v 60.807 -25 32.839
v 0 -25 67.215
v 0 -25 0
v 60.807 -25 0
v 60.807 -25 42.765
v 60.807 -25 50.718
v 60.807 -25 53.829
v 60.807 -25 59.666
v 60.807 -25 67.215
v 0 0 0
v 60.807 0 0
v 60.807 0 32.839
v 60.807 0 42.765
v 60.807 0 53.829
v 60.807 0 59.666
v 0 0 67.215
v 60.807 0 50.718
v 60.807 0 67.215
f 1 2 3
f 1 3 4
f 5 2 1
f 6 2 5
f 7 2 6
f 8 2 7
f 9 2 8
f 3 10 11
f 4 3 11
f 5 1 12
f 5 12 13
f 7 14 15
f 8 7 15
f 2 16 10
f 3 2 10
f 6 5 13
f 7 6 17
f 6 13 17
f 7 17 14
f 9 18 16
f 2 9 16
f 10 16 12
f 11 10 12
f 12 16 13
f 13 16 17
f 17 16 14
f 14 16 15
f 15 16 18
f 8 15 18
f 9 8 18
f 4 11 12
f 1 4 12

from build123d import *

# Parameters (mm, degrees)
F0_W     = 60.8069598675
F0_H     = 7.9524954781
F0_W_2   = 60.8069561422
F0_H_2   = 32.8389271162
F1_DEPTH = 25


# Not quite as in the source:
# - ends of sketch curves that miss each other by under 0.0002 mm in the source are joined


with BuildPart() as f1:
    # F0 (on Front) → F1 (new body)
    with BuildSketch(Plane.XZ):
        Polygon((60.8069561422, 67.2151967883), (0, 67.2151967883), (0, 62.0886087418), (0, 59.6657376736), (60.8069561422, 59.6657376736), (60.8069561422, 62.0886087418), align=None)
        Polygon((60.8069561422, 59.6657376736), (0, 59.6657376736), (0, 53.8291148841), (0, 50.7177971303), (60.8069598675, 50.7177971303), (60.8069598675, 53.8291148841), align=None)
        with Locations((30.4034799337, 46.7415493913)):
            Rectangle(F0_W, F0_H)
        Polygon((60.8069598675, 42.7653016523), (0, 42.7653016523), (0, 32.8389271162), (60.8069561422, 32.8389271162), align=None)
        with Locations((30.4034780711, 16.4194635581)):
            Rectangle(F0_W_2, F0_H_2)
    extrude(amount=F1_DEPTH)


solid = f1.part
